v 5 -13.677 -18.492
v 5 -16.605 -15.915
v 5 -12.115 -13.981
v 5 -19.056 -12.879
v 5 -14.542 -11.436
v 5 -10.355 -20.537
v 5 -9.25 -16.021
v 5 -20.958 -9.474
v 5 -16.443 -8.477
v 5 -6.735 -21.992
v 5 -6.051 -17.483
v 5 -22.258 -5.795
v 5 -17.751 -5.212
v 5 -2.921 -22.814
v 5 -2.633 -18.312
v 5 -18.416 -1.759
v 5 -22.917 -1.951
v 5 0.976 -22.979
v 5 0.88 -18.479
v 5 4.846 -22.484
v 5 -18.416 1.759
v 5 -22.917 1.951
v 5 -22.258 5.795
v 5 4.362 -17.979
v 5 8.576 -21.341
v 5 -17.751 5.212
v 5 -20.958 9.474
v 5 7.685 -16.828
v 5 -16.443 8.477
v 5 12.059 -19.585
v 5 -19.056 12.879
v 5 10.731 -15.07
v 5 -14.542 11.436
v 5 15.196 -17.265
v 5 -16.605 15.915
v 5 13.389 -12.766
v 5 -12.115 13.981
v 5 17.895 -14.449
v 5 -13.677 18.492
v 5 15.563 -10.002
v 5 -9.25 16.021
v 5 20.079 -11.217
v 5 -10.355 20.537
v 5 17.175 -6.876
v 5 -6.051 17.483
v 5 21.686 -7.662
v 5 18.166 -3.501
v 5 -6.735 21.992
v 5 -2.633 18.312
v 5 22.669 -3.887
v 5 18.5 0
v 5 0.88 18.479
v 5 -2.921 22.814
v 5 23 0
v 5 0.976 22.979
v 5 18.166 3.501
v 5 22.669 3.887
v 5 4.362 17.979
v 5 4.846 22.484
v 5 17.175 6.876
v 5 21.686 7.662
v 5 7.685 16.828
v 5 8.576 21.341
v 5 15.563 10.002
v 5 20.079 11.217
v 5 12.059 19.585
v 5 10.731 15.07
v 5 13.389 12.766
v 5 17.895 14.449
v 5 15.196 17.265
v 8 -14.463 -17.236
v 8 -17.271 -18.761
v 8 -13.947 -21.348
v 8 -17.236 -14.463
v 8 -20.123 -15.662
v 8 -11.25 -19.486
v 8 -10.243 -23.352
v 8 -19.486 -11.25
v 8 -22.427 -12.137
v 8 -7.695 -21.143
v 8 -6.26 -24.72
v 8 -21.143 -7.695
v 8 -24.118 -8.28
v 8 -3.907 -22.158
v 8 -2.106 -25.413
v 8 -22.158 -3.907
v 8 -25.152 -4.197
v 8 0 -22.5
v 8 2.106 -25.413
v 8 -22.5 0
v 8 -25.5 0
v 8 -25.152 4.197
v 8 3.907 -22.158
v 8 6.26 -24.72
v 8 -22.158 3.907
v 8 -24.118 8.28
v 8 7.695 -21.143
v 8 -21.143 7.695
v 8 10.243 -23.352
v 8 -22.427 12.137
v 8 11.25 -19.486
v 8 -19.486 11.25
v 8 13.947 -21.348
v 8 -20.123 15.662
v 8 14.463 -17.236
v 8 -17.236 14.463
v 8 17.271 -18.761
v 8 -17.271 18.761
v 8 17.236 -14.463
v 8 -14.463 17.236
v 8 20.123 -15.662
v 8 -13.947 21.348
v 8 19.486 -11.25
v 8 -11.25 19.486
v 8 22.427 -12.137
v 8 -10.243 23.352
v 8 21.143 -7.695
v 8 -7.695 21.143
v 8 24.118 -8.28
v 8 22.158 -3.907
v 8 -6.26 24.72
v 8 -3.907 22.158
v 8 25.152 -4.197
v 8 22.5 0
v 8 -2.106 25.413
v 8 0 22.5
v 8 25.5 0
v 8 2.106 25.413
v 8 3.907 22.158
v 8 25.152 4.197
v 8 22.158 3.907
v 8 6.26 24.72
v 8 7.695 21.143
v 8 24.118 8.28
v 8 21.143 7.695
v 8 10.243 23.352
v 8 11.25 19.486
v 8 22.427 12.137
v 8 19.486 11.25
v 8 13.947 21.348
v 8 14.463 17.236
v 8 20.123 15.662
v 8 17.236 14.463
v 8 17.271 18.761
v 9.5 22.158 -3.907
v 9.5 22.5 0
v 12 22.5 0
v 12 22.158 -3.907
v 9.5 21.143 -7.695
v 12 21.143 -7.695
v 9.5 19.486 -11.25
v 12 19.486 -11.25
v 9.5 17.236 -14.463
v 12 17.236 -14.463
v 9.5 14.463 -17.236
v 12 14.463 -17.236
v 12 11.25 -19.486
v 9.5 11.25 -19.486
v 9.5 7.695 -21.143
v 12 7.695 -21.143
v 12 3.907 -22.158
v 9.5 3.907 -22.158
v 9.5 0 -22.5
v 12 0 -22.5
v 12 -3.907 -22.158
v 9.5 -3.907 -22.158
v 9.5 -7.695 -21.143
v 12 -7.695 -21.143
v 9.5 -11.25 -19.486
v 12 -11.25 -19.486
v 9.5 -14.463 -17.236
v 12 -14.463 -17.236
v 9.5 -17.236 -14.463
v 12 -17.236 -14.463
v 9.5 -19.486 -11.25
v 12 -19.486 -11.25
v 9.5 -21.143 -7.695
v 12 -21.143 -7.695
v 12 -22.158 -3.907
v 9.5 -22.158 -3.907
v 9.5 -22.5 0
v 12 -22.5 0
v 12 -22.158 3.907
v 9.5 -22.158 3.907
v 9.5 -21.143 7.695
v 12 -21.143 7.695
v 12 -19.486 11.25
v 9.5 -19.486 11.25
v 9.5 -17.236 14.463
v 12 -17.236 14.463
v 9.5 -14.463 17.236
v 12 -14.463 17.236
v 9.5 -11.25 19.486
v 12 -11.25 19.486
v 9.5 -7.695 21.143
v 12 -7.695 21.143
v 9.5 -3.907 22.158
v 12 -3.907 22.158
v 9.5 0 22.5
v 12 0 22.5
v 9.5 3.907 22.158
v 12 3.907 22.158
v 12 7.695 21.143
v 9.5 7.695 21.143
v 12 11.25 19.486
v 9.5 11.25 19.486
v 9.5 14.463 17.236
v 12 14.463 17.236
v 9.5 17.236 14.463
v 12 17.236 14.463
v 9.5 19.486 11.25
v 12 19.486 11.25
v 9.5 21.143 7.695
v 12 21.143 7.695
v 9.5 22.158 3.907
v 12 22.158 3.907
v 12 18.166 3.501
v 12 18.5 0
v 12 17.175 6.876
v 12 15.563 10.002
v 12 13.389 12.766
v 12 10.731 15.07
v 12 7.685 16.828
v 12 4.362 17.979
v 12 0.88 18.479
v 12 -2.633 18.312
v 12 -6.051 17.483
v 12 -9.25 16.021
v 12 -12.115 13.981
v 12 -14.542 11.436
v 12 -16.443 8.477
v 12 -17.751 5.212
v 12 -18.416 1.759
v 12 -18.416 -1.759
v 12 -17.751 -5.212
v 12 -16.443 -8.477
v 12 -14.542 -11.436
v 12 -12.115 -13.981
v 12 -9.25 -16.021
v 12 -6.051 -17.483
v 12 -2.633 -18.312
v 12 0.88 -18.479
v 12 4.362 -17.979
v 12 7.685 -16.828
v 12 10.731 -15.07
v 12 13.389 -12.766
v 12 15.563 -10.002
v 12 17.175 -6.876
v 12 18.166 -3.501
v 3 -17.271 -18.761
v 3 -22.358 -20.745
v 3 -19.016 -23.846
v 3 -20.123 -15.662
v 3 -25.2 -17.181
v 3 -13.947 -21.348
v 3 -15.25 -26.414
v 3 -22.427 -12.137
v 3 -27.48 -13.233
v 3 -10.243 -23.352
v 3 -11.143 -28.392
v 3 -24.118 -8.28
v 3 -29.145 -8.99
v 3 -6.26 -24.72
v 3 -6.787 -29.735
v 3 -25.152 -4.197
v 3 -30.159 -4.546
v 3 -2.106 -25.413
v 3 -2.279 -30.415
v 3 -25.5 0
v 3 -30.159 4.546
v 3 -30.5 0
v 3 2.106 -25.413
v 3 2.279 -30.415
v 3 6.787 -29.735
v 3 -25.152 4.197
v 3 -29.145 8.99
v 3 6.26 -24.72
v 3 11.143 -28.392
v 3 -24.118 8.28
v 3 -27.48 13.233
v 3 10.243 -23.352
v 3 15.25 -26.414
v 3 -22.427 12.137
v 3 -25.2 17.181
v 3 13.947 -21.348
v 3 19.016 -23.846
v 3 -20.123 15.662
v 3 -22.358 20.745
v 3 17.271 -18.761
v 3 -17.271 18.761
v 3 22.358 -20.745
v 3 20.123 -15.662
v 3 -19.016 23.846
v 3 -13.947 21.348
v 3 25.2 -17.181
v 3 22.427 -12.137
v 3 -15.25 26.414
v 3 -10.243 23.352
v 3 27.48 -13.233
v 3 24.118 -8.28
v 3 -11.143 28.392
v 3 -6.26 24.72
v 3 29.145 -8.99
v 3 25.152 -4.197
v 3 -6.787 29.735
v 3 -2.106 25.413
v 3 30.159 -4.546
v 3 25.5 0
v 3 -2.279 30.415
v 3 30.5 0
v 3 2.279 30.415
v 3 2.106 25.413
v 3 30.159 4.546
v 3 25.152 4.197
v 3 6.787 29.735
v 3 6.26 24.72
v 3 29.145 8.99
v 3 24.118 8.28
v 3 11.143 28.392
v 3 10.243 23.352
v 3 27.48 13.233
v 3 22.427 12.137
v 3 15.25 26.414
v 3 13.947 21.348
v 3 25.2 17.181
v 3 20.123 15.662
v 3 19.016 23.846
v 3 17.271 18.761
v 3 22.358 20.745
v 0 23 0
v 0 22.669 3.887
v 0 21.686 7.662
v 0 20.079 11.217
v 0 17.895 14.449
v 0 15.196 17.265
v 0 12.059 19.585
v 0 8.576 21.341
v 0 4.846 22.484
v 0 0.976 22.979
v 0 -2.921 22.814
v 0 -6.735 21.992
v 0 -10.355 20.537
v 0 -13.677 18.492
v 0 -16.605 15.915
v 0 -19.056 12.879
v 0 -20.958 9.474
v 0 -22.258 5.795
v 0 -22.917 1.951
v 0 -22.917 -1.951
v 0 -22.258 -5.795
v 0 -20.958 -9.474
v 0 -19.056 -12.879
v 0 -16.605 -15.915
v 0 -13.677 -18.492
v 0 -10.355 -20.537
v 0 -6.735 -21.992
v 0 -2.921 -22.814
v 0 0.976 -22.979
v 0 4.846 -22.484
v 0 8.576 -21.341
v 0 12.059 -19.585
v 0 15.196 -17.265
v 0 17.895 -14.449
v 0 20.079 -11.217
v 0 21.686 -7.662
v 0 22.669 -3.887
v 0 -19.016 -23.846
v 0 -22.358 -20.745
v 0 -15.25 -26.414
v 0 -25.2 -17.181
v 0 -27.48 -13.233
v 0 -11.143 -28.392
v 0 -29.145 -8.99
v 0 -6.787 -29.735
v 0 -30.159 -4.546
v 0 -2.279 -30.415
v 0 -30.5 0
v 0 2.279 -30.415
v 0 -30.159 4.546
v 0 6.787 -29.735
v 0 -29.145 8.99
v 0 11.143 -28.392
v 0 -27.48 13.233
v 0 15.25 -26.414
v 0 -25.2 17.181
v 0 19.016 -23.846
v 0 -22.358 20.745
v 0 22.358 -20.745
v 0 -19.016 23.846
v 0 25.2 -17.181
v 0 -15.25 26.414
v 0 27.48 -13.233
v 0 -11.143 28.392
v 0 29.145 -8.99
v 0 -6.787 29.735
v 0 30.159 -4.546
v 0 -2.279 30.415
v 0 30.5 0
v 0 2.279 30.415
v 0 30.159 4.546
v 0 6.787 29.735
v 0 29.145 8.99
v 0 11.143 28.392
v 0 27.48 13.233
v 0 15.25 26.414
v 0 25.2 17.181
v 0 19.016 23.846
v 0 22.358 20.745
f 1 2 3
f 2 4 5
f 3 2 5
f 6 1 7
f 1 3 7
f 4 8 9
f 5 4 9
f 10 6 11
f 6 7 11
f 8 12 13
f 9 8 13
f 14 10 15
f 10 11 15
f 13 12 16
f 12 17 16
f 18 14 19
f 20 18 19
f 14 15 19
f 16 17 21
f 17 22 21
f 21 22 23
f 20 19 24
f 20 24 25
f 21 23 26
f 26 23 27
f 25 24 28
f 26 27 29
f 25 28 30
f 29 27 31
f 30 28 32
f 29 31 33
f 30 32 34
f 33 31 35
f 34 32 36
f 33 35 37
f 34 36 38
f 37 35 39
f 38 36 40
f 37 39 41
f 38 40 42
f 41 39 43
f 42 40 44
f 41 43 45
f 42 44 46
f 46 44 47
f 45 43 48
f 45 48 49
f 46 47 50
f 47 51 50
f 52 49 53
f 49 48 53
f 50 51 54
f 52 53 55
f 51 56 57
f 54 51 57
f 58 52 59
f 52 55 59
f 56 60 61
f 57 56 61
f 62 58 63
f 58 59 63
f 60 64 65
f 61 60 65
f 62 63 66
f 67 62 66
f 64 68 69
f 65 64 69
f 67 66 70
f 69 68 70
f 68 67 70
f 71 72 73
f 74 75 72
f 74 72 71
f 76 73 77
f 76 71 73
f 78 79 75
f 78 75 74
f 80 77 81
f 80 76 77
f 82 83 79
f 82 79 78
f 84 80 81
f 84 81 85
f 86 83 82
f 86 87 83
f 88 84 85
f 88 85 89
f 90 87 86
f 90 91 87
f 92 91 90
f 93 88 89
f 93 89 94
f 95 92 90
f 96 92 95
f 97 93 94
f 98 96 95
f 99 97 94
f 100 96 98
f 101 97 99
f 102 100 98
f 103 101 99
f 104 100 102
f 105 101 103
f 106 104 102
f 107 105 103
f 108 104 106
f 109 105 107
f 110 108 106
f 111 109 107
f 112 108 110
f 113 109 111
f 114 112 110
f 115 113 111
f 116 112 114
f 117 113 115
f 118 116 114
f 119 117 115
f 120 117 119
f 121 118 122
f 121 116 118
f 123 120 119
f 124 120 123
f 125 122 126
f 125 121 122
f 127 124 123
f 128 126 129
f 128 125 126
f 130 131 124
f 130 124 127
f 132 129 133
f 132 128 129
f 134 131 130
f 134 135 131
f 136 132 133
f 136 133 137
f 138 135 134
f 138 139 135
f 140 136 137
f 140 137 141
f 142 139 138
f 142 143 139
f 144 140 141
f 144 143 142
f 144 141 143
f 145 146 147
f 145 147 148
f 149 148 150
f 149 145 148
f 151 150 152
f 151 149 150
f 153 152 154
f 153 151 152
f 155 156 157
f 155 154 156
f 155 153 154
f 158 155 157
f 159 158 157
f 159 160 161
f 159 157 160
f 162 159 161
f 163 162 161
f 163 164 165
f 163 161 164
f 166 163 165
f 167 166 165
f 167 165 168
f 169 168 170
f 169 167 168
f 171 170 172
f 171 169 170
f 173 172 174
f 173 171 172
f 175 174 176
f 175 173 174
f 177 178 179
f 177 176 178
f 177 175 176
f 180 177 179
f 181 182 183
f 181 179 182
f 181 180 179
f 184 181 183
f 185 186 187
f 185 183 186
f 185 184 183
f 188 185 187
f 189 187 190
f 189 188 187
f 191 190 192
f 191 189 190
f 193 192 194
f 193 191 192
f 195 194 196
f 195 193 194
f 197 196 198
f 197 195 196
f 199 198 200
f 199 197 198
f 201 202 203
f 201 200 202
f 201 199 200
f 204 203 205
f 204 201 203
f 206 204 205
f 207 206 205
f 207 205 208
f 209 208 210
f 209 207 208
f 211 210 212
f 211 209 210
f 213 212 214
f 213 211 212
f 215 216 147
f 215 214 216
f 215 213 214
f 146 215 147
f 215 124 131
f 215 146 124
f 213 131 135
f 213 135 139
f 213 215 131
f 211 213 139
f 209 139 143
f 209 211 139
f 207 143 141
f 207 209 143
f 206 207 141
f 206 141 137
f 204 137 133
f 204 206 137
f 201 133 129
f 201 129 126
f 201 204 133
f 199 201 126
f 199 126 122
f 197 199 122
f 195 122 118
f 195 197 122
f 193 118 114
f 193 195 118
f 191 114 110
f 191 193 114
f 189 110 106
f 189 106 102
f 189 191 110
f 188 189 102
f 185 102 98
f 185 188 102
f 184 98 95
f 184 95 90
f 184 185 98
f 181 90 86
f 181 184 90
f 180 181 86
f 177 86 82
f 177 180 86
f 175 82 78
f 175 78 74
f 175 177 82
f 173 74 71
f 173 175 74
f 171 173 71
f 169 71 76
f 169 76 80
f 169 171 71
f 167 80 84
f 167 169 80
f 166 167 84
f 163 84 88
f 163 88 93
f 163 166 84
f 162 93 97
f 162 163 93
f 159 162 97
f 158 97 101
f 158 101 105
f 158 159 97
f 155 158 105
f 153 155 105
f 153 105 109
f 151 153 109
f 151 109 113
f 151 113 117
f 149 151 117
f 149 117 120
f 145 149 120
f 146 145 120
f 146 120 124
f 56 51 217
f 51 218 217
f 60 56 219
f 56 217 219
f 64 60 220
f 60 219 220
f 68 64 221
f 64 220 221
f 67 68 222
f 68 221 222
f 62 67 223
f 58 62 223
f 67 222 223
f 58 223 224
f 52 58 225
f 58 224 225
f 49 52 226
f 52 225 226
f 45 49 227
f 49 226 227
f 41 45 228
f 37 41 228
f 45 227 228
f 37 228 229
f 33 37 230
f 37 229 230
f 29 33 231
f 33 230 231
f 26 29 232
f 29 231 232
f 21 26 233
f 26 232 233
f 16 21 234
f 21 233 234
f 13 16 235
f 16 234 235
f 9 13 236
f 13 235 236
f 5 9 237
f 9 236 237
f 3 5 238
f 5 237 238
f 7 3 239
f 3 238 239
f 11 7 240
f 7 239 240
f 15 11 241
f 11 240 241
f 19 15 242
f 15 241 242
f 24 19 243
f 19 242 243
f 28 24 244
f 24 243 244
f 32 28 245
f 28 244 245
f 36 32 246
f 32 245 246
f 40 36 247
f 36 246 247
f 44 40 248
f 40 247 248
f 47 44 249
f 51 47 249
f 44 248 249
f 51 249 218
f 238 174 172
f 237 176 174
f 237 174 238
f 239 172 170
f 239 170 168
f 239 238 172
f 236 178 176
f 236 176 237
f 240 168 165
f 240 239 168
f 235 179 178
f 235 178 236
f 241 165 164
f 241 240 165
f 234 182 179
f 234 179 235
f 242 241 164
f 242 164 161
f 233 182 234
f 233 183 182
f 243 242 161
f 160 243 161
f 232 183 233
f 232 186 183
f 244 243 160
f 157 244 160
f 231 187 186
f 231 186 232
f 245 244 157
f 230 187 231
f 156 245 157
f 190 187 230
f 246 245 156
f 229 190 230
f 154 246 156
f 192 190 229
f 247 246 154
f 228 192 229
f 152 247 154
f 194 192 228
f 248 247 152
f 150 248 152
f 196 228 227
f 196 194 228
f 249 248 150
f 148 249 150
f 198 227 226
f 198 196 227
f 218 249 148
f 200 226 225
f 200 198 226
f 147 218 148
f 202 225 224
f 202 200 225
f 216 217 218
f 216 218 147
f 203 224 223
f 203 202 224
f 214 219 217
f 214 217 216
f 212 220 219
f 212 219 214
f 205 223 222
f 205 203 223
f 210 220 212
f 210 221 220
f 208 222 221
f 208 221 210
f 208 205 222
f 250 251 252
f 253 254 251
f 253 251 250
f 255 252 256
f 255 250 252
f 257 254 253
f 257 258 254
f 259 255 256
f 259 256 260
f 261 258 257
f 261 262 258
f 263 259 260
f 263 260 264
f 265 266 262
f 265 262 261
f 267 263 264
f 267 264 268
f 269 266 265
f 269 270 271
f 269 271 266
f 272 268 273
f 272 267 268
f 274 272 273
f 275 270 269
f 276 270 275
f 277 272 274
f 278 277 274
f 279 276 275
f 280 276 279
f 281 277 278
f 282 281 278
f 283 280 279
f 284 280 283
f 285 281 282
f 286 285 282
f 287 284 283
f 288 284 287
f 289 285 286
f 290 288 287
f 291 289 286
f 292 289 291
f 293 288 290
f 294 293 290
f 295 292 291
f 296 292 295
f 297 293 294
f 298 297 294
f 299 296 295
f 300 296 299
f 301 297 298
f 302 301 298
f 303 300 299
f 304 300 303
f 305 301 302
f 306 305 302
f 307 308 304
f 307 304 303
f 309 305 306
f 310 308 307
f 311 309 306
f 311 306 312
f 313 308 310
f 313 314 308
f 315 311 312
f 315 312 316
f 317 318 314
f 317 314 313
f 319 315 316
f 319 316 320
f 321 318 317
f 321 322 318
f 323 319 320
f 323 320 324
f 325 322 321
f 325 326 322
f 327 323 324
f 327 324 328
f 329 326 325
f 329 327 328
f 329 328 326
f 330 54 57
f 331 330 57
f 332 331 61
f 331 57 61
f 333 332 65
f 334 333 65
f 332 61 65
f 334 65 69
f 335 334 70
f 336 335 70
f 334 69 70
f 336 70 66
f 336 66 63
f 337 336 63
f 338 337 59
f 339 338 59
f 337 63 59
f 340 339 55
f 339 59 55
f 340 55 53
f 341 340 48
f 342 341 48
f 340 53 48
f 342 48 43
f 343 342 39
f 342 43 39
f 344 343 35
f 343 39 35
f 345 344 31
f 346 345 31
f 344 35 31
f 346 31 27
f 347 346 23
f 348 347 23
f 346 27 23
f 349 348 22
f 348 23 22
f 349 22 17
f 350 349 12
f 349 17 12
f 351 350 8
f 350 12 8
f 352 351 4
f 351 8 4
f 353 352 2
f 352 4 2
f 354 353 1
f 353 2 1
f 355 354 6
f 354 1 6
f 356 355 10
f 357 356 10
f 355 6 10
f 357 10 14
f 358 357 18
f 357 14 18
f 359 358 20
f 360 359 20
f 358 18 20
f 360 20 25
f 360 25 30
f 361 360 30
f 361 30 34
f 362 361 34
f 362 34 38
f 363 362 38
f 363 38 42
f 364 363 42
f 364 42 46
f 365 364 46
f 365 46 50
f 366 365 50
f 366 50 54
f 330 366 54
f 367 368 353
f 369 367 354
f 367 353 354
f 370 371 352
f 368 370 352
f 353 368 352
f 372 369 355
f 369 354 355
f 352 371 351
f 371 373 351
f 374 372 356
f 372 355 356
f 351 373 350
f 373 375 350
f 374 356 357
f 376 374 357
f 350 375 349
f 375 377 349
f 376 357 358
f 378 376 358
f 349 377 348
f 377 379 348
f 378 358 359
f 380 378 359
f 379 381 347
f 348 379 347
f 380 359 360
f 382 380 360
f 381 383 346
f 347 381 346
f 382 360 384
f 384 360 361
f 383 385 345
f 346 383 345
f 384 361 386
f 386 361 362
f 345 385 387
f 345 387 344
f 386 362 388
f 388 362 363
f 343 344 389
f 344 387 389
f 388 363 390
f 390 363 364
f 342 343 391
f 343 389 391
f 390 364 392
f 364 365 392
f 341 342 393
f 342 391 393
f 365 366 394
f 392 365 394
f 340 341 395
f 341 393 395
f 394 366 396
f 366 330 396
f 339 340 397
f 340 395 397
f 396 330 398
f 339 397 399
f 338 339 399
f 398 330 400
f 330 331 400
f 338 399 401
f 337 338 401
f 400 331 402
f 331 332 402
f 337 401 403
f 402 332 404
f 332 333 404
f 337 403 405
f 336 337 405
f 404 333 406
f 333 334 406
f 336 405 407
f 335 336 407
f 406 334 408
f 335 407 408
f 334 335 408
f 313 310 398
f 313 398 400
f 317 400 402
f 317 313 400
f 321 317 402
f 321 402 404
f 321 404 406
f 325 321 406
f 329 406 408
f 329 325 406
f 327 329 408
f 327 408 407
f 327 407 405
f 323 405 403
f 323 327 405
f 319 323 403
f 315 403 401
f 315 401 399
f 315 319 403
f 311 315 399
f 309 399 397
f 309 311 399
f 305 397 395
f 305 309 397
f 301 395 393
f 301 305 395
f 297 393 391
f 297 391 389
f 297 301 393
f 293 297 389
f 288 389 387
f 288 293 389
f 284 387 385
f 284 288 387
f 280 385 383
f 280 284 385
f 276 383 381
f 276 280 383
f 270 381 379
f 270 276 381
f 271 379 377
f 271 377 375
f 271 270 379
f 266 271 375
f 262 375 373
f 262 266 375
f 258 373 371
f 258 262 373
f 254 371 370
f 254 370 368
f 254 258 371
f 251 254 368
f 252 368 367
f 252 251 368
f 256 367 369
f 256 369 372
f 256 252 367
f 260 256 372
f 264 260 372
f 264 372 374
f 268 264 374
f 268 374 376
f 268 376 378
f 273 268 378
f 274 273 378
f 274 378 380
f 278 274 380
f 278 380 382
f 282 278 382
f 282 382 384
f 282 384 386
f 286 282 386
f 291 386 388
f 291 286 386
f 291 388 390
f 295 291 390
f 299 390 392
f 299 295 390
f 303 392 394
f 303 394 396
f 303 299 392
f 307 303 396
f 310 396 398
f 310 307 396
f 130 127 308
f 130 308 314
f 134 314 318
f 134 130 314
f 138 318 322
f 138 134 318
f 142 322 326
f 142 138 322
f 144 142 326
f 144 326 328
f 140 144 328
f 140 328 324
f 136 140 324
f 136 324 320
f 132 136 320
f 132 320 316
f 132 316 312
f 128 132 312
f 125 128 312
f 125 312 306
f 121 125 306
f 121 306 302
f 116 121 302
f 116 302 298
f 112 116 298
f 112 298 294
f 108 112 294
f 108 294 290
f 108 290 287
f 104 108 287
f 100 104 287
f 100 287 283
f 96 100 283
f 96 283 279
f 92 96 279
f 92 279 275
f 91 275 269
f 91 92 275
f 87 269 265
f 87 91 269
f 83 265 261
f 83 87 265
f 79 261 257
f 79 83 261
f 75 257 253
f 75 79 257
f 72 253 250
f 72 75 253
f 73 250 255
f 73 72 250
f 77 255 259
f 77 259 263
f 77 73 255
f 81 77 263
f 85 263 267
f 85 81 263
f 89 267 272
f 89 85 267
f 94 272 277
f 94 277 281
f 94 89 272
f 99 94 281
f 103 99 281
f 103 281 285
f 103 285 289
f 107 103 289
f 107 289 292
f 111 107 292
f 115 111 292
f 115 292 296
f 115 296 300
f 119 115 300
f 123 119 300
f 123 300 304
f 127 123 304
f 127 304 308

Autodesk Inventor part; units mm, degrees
ref_plane "YZ Plane" through (0, 0, 0) normal (1, 0, 0) x (0, 1, 0)
ref_plane "XZ Plane" through (0, 0, 0) normal (0, 1, 0) x (-1, 0, 0)
ref_plane "XY Plane" through (0, 0, 0) normal (0, 0, 1) x (1, 0, 0)
sketch "Sketch1" plane through (0, 0, 0) normal (0, 0, 1) x (1, 0, 0)
  line L0 (0, 0) -> (10, 0)
  line L1 (0, 23) -> (5, 23)
  line L2 (5, 23) -> (5, 18.5)
  line L3 (12, 18.5) -> (12, 22.5)
  line L4 (12, 22.5) -> (9.5, 22.5)
  line L5 (0, 30.5) -> (0, 23)
  line L6 (5, 18.5) -> (12, 18.5)
  line L7 (0, 30.5) -> (3, 30.5)
  line L8 (3, 30.5) -> (3, 25.5)
  line L9 (3, 25.5) -> (8, 25.5)
  line L10 (8, 25.5) -> (8, 22.5)
  line L11 (8, 22.5) -> (9.5, 22.5)
  dimension "d0" = 10
  dimension "d1" = 23
  dimension "d2" = 5
  dimension "d4" = 7
  dimension "d9" = 4.5
  dimension "d10" = 18.5
  dimension "d11" = 3
  dimension "d12" = 5
  dimension "d13" = 5
revolve "Revolution1" add sketch "Sketch1" angle 360 about axis through (0, 0, 0) along (1, 0, 0)
properties part number "raccord rous libre"
